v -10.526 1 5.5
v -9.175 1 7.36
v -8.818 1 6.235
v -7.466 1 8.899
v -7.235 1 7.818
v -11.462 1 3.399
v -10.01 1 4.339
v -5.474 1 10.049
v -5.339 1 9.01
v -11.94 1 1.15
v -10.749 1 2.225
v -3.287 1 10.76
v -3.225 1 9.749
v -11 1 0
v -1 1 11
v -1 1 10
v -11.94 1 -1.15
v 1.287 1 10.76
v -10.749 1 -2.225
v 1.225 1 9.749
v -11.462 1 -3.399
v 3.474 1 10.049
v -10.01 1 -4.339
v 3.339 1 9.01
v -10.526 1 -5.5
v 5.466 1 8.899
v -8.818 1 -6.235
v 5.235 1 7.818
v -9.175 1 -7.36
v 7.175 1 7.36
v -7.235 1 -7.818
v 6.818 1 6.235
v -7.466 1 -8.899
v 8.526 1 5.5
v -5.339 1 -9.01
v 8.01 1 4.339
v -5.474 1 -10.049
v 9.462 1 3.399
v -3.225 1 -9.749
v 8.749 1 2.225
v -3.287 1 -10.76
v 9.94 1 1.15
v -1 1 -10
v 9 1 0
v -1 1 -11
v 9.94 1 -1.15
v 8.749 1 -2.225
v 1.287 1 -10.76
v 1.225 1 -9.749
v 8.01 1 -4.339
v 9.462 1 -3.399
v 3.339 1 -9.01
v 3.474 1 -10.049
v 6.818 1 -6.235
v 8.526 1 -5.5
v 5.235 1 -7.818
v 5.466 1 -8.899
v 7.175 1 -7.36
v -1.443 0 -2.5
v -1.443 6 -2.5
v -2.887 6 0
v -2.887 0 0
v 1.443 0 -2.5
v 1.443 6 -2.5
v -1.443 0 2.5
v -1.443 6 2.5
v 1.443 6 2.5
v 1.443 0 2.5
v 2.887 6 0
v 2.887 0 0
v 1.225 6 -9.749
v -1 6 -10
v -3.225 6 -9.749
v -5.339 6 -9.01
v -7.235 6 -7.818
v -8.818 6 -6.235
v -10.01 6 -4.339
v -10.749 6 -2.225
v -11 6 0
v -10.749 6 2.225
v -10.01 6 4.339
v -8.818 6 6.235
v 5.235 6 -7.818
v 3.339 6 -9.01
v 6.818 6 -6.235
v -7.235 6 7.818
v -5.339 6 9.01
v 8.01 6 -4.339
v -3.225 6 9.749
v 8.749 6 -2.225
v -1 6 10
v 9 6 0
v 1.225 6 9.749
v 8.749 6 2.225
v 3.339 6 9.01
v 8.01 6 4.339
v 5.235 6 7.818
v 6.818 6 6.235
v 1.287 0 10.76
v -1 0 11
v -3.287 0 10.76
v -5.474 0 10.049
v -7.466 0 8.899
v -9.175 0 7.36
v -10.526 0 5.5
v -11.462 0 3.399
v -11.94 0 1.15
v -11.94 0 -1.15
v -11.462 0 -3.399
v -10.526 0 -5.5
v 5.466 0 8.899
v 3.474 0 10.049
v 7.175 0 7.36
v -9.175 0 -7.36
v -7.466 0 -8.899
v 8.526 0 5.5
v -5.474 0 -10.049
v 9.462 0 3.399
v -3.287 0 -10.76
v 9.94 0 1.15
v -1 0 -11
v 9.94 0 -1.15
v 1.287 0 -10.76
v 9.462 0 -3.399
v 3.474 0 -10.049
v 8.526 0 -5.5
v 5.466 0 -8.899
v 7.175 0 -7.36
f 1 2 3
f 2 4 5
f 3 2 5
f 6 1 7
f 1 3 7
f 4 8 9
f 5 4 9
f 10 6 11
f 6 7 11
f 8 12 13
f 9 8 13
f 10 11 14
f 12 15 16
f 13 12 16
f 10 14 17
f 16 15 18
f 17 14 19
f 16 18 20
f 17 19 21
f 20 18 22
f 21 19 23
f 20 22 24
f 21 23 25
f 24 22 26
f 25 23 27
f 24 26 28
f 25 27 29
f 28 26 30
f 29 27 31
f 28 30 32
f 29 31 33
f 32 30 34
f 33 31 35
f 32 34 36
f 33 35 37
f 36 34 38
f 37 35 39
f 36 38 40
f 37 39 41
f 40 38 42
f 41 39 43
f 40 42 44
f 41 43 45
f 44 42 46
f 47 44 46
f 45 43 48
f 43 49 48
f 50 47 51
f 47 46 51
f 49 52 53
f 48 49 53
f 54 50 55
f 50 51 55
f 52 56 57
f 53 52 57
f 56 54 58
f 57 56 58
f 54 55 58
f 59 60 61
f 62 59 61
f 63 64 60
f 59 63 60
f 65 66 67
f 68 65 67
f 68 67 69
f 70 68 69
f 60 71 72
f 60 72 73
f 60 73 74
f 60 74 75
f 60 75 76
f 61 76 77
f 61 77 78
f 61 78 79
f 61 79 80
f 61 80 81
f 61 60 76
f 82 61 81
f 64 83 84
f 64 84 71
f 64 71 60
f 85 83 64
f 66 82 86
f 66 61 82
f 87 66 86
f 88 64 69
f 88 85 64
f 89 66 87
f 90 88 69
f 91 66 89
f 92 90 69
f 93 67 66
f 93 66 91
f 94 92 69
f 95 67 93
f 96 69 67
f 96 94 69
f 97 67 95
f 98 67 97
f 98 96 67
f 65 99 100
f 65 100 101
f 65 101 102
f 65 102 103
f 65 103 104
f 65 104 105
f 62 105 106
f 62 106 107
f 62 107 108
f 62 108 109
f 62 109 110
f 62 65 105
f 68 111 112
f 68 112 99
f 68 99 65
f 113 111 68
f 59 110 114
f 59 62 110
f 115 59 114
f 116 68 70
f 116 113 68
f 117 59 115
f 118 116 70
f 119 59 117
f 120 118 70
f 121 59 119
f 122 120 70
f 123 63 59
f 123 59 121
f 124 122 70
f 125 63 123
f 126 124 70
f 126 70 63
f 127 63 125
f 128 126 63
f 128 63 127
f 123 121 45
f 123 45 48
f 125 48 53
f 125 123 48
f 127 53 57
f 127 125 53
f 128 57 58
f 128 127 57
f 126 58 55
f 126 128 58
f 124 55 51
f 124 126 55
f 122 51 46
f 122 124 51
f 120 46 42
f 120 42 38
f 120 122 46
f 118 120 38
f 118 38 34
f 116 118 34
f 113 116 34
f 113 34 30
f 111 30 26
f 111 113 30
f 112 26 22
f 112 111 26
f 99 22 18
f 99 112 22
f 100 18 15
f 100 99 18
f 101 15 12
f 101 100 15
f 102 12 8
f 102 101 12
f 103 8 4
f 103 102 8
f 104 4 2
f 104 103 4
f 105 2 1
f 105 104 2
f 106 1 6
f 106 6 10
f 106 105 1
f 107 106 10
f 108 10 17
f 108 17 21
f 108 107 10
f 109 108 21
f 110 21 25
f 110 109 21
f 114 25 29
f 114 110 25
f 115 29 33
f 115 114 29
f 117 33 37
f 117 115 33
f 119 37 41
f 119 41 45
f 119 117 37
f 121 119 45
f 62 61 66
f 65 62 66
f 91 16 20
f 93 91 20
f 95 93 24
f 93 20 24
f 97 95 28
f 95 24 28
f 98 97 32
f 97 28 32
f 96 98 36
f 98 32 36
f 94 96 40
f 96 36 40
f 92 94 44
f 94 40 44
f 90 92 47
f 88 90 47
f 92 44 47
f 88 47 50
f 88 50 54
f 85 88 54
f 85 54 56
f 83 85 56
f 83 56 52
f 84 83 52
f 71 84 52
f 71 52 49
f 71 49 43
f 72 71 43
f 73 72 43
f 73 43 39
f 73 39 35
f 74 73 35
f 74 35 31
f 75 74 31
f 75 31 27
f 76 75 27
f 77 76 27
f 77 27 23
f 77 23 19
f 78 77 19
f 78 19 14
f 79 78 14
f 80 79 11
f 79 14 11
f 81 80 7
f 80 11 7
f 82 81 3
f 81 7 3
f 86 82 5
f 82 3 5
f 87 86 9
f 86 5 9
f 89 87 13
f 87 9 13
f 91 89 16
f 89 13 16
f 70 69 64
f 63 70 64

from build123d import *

# Parameters (mm, degrees)
SKETCH1_R           = 10
BOSS_EXTRUDE1_DEPTH = 6
SKETCH2_R           = 11
BOSS_EXTRUDE2_DEPTH = 1
CUT_EXTRUDE1_DEPTH  = 18.349351573


with BuildPart() as part:
    # Sketch1 → Boss-Extrude1 (new body)
    with BuildSketch(Plane(origin=(0, 0, 0), x_dir=(1, 0, 0), z_dir=(0, 1, 0))):
        with Locations(Location((-1, 0, 0), (0, 0, 270))):
            Circle(SKETCH1_R)
    extrude(amount=BOSS_EXTRUDE1_DEPTH)

    # Sketch2 → Boss-Extrude2 (add)
    with BuildSketch(Plane.XZ):
        with Locations(Location((-1, 0, 0), (0, 0, 270))):
            Circle(SKETCH2_R)
    extrude(amount=-BOSS_EXTRUDE2_DEPTH)

    # Sketch4 → Cut-Extrude1 (cut, through all)
    with BuildSketch(Plane(origin=(0, 6, 0), x_dir=(1, 0, 0), z_dir=(0, 1, 0))):
        Polygon((2.886751346, 0), (1.443375673, 2.5), (-1.443375673, 2.5), (-2.886751346, 0), (-1.443375673, -2.5), (1.443375673, -2.5), align=None)
    extrude(amount=-CUT_EXTRUDE1_DEPTH, mode=Mode.SUBTRACT)


solid = part.part
